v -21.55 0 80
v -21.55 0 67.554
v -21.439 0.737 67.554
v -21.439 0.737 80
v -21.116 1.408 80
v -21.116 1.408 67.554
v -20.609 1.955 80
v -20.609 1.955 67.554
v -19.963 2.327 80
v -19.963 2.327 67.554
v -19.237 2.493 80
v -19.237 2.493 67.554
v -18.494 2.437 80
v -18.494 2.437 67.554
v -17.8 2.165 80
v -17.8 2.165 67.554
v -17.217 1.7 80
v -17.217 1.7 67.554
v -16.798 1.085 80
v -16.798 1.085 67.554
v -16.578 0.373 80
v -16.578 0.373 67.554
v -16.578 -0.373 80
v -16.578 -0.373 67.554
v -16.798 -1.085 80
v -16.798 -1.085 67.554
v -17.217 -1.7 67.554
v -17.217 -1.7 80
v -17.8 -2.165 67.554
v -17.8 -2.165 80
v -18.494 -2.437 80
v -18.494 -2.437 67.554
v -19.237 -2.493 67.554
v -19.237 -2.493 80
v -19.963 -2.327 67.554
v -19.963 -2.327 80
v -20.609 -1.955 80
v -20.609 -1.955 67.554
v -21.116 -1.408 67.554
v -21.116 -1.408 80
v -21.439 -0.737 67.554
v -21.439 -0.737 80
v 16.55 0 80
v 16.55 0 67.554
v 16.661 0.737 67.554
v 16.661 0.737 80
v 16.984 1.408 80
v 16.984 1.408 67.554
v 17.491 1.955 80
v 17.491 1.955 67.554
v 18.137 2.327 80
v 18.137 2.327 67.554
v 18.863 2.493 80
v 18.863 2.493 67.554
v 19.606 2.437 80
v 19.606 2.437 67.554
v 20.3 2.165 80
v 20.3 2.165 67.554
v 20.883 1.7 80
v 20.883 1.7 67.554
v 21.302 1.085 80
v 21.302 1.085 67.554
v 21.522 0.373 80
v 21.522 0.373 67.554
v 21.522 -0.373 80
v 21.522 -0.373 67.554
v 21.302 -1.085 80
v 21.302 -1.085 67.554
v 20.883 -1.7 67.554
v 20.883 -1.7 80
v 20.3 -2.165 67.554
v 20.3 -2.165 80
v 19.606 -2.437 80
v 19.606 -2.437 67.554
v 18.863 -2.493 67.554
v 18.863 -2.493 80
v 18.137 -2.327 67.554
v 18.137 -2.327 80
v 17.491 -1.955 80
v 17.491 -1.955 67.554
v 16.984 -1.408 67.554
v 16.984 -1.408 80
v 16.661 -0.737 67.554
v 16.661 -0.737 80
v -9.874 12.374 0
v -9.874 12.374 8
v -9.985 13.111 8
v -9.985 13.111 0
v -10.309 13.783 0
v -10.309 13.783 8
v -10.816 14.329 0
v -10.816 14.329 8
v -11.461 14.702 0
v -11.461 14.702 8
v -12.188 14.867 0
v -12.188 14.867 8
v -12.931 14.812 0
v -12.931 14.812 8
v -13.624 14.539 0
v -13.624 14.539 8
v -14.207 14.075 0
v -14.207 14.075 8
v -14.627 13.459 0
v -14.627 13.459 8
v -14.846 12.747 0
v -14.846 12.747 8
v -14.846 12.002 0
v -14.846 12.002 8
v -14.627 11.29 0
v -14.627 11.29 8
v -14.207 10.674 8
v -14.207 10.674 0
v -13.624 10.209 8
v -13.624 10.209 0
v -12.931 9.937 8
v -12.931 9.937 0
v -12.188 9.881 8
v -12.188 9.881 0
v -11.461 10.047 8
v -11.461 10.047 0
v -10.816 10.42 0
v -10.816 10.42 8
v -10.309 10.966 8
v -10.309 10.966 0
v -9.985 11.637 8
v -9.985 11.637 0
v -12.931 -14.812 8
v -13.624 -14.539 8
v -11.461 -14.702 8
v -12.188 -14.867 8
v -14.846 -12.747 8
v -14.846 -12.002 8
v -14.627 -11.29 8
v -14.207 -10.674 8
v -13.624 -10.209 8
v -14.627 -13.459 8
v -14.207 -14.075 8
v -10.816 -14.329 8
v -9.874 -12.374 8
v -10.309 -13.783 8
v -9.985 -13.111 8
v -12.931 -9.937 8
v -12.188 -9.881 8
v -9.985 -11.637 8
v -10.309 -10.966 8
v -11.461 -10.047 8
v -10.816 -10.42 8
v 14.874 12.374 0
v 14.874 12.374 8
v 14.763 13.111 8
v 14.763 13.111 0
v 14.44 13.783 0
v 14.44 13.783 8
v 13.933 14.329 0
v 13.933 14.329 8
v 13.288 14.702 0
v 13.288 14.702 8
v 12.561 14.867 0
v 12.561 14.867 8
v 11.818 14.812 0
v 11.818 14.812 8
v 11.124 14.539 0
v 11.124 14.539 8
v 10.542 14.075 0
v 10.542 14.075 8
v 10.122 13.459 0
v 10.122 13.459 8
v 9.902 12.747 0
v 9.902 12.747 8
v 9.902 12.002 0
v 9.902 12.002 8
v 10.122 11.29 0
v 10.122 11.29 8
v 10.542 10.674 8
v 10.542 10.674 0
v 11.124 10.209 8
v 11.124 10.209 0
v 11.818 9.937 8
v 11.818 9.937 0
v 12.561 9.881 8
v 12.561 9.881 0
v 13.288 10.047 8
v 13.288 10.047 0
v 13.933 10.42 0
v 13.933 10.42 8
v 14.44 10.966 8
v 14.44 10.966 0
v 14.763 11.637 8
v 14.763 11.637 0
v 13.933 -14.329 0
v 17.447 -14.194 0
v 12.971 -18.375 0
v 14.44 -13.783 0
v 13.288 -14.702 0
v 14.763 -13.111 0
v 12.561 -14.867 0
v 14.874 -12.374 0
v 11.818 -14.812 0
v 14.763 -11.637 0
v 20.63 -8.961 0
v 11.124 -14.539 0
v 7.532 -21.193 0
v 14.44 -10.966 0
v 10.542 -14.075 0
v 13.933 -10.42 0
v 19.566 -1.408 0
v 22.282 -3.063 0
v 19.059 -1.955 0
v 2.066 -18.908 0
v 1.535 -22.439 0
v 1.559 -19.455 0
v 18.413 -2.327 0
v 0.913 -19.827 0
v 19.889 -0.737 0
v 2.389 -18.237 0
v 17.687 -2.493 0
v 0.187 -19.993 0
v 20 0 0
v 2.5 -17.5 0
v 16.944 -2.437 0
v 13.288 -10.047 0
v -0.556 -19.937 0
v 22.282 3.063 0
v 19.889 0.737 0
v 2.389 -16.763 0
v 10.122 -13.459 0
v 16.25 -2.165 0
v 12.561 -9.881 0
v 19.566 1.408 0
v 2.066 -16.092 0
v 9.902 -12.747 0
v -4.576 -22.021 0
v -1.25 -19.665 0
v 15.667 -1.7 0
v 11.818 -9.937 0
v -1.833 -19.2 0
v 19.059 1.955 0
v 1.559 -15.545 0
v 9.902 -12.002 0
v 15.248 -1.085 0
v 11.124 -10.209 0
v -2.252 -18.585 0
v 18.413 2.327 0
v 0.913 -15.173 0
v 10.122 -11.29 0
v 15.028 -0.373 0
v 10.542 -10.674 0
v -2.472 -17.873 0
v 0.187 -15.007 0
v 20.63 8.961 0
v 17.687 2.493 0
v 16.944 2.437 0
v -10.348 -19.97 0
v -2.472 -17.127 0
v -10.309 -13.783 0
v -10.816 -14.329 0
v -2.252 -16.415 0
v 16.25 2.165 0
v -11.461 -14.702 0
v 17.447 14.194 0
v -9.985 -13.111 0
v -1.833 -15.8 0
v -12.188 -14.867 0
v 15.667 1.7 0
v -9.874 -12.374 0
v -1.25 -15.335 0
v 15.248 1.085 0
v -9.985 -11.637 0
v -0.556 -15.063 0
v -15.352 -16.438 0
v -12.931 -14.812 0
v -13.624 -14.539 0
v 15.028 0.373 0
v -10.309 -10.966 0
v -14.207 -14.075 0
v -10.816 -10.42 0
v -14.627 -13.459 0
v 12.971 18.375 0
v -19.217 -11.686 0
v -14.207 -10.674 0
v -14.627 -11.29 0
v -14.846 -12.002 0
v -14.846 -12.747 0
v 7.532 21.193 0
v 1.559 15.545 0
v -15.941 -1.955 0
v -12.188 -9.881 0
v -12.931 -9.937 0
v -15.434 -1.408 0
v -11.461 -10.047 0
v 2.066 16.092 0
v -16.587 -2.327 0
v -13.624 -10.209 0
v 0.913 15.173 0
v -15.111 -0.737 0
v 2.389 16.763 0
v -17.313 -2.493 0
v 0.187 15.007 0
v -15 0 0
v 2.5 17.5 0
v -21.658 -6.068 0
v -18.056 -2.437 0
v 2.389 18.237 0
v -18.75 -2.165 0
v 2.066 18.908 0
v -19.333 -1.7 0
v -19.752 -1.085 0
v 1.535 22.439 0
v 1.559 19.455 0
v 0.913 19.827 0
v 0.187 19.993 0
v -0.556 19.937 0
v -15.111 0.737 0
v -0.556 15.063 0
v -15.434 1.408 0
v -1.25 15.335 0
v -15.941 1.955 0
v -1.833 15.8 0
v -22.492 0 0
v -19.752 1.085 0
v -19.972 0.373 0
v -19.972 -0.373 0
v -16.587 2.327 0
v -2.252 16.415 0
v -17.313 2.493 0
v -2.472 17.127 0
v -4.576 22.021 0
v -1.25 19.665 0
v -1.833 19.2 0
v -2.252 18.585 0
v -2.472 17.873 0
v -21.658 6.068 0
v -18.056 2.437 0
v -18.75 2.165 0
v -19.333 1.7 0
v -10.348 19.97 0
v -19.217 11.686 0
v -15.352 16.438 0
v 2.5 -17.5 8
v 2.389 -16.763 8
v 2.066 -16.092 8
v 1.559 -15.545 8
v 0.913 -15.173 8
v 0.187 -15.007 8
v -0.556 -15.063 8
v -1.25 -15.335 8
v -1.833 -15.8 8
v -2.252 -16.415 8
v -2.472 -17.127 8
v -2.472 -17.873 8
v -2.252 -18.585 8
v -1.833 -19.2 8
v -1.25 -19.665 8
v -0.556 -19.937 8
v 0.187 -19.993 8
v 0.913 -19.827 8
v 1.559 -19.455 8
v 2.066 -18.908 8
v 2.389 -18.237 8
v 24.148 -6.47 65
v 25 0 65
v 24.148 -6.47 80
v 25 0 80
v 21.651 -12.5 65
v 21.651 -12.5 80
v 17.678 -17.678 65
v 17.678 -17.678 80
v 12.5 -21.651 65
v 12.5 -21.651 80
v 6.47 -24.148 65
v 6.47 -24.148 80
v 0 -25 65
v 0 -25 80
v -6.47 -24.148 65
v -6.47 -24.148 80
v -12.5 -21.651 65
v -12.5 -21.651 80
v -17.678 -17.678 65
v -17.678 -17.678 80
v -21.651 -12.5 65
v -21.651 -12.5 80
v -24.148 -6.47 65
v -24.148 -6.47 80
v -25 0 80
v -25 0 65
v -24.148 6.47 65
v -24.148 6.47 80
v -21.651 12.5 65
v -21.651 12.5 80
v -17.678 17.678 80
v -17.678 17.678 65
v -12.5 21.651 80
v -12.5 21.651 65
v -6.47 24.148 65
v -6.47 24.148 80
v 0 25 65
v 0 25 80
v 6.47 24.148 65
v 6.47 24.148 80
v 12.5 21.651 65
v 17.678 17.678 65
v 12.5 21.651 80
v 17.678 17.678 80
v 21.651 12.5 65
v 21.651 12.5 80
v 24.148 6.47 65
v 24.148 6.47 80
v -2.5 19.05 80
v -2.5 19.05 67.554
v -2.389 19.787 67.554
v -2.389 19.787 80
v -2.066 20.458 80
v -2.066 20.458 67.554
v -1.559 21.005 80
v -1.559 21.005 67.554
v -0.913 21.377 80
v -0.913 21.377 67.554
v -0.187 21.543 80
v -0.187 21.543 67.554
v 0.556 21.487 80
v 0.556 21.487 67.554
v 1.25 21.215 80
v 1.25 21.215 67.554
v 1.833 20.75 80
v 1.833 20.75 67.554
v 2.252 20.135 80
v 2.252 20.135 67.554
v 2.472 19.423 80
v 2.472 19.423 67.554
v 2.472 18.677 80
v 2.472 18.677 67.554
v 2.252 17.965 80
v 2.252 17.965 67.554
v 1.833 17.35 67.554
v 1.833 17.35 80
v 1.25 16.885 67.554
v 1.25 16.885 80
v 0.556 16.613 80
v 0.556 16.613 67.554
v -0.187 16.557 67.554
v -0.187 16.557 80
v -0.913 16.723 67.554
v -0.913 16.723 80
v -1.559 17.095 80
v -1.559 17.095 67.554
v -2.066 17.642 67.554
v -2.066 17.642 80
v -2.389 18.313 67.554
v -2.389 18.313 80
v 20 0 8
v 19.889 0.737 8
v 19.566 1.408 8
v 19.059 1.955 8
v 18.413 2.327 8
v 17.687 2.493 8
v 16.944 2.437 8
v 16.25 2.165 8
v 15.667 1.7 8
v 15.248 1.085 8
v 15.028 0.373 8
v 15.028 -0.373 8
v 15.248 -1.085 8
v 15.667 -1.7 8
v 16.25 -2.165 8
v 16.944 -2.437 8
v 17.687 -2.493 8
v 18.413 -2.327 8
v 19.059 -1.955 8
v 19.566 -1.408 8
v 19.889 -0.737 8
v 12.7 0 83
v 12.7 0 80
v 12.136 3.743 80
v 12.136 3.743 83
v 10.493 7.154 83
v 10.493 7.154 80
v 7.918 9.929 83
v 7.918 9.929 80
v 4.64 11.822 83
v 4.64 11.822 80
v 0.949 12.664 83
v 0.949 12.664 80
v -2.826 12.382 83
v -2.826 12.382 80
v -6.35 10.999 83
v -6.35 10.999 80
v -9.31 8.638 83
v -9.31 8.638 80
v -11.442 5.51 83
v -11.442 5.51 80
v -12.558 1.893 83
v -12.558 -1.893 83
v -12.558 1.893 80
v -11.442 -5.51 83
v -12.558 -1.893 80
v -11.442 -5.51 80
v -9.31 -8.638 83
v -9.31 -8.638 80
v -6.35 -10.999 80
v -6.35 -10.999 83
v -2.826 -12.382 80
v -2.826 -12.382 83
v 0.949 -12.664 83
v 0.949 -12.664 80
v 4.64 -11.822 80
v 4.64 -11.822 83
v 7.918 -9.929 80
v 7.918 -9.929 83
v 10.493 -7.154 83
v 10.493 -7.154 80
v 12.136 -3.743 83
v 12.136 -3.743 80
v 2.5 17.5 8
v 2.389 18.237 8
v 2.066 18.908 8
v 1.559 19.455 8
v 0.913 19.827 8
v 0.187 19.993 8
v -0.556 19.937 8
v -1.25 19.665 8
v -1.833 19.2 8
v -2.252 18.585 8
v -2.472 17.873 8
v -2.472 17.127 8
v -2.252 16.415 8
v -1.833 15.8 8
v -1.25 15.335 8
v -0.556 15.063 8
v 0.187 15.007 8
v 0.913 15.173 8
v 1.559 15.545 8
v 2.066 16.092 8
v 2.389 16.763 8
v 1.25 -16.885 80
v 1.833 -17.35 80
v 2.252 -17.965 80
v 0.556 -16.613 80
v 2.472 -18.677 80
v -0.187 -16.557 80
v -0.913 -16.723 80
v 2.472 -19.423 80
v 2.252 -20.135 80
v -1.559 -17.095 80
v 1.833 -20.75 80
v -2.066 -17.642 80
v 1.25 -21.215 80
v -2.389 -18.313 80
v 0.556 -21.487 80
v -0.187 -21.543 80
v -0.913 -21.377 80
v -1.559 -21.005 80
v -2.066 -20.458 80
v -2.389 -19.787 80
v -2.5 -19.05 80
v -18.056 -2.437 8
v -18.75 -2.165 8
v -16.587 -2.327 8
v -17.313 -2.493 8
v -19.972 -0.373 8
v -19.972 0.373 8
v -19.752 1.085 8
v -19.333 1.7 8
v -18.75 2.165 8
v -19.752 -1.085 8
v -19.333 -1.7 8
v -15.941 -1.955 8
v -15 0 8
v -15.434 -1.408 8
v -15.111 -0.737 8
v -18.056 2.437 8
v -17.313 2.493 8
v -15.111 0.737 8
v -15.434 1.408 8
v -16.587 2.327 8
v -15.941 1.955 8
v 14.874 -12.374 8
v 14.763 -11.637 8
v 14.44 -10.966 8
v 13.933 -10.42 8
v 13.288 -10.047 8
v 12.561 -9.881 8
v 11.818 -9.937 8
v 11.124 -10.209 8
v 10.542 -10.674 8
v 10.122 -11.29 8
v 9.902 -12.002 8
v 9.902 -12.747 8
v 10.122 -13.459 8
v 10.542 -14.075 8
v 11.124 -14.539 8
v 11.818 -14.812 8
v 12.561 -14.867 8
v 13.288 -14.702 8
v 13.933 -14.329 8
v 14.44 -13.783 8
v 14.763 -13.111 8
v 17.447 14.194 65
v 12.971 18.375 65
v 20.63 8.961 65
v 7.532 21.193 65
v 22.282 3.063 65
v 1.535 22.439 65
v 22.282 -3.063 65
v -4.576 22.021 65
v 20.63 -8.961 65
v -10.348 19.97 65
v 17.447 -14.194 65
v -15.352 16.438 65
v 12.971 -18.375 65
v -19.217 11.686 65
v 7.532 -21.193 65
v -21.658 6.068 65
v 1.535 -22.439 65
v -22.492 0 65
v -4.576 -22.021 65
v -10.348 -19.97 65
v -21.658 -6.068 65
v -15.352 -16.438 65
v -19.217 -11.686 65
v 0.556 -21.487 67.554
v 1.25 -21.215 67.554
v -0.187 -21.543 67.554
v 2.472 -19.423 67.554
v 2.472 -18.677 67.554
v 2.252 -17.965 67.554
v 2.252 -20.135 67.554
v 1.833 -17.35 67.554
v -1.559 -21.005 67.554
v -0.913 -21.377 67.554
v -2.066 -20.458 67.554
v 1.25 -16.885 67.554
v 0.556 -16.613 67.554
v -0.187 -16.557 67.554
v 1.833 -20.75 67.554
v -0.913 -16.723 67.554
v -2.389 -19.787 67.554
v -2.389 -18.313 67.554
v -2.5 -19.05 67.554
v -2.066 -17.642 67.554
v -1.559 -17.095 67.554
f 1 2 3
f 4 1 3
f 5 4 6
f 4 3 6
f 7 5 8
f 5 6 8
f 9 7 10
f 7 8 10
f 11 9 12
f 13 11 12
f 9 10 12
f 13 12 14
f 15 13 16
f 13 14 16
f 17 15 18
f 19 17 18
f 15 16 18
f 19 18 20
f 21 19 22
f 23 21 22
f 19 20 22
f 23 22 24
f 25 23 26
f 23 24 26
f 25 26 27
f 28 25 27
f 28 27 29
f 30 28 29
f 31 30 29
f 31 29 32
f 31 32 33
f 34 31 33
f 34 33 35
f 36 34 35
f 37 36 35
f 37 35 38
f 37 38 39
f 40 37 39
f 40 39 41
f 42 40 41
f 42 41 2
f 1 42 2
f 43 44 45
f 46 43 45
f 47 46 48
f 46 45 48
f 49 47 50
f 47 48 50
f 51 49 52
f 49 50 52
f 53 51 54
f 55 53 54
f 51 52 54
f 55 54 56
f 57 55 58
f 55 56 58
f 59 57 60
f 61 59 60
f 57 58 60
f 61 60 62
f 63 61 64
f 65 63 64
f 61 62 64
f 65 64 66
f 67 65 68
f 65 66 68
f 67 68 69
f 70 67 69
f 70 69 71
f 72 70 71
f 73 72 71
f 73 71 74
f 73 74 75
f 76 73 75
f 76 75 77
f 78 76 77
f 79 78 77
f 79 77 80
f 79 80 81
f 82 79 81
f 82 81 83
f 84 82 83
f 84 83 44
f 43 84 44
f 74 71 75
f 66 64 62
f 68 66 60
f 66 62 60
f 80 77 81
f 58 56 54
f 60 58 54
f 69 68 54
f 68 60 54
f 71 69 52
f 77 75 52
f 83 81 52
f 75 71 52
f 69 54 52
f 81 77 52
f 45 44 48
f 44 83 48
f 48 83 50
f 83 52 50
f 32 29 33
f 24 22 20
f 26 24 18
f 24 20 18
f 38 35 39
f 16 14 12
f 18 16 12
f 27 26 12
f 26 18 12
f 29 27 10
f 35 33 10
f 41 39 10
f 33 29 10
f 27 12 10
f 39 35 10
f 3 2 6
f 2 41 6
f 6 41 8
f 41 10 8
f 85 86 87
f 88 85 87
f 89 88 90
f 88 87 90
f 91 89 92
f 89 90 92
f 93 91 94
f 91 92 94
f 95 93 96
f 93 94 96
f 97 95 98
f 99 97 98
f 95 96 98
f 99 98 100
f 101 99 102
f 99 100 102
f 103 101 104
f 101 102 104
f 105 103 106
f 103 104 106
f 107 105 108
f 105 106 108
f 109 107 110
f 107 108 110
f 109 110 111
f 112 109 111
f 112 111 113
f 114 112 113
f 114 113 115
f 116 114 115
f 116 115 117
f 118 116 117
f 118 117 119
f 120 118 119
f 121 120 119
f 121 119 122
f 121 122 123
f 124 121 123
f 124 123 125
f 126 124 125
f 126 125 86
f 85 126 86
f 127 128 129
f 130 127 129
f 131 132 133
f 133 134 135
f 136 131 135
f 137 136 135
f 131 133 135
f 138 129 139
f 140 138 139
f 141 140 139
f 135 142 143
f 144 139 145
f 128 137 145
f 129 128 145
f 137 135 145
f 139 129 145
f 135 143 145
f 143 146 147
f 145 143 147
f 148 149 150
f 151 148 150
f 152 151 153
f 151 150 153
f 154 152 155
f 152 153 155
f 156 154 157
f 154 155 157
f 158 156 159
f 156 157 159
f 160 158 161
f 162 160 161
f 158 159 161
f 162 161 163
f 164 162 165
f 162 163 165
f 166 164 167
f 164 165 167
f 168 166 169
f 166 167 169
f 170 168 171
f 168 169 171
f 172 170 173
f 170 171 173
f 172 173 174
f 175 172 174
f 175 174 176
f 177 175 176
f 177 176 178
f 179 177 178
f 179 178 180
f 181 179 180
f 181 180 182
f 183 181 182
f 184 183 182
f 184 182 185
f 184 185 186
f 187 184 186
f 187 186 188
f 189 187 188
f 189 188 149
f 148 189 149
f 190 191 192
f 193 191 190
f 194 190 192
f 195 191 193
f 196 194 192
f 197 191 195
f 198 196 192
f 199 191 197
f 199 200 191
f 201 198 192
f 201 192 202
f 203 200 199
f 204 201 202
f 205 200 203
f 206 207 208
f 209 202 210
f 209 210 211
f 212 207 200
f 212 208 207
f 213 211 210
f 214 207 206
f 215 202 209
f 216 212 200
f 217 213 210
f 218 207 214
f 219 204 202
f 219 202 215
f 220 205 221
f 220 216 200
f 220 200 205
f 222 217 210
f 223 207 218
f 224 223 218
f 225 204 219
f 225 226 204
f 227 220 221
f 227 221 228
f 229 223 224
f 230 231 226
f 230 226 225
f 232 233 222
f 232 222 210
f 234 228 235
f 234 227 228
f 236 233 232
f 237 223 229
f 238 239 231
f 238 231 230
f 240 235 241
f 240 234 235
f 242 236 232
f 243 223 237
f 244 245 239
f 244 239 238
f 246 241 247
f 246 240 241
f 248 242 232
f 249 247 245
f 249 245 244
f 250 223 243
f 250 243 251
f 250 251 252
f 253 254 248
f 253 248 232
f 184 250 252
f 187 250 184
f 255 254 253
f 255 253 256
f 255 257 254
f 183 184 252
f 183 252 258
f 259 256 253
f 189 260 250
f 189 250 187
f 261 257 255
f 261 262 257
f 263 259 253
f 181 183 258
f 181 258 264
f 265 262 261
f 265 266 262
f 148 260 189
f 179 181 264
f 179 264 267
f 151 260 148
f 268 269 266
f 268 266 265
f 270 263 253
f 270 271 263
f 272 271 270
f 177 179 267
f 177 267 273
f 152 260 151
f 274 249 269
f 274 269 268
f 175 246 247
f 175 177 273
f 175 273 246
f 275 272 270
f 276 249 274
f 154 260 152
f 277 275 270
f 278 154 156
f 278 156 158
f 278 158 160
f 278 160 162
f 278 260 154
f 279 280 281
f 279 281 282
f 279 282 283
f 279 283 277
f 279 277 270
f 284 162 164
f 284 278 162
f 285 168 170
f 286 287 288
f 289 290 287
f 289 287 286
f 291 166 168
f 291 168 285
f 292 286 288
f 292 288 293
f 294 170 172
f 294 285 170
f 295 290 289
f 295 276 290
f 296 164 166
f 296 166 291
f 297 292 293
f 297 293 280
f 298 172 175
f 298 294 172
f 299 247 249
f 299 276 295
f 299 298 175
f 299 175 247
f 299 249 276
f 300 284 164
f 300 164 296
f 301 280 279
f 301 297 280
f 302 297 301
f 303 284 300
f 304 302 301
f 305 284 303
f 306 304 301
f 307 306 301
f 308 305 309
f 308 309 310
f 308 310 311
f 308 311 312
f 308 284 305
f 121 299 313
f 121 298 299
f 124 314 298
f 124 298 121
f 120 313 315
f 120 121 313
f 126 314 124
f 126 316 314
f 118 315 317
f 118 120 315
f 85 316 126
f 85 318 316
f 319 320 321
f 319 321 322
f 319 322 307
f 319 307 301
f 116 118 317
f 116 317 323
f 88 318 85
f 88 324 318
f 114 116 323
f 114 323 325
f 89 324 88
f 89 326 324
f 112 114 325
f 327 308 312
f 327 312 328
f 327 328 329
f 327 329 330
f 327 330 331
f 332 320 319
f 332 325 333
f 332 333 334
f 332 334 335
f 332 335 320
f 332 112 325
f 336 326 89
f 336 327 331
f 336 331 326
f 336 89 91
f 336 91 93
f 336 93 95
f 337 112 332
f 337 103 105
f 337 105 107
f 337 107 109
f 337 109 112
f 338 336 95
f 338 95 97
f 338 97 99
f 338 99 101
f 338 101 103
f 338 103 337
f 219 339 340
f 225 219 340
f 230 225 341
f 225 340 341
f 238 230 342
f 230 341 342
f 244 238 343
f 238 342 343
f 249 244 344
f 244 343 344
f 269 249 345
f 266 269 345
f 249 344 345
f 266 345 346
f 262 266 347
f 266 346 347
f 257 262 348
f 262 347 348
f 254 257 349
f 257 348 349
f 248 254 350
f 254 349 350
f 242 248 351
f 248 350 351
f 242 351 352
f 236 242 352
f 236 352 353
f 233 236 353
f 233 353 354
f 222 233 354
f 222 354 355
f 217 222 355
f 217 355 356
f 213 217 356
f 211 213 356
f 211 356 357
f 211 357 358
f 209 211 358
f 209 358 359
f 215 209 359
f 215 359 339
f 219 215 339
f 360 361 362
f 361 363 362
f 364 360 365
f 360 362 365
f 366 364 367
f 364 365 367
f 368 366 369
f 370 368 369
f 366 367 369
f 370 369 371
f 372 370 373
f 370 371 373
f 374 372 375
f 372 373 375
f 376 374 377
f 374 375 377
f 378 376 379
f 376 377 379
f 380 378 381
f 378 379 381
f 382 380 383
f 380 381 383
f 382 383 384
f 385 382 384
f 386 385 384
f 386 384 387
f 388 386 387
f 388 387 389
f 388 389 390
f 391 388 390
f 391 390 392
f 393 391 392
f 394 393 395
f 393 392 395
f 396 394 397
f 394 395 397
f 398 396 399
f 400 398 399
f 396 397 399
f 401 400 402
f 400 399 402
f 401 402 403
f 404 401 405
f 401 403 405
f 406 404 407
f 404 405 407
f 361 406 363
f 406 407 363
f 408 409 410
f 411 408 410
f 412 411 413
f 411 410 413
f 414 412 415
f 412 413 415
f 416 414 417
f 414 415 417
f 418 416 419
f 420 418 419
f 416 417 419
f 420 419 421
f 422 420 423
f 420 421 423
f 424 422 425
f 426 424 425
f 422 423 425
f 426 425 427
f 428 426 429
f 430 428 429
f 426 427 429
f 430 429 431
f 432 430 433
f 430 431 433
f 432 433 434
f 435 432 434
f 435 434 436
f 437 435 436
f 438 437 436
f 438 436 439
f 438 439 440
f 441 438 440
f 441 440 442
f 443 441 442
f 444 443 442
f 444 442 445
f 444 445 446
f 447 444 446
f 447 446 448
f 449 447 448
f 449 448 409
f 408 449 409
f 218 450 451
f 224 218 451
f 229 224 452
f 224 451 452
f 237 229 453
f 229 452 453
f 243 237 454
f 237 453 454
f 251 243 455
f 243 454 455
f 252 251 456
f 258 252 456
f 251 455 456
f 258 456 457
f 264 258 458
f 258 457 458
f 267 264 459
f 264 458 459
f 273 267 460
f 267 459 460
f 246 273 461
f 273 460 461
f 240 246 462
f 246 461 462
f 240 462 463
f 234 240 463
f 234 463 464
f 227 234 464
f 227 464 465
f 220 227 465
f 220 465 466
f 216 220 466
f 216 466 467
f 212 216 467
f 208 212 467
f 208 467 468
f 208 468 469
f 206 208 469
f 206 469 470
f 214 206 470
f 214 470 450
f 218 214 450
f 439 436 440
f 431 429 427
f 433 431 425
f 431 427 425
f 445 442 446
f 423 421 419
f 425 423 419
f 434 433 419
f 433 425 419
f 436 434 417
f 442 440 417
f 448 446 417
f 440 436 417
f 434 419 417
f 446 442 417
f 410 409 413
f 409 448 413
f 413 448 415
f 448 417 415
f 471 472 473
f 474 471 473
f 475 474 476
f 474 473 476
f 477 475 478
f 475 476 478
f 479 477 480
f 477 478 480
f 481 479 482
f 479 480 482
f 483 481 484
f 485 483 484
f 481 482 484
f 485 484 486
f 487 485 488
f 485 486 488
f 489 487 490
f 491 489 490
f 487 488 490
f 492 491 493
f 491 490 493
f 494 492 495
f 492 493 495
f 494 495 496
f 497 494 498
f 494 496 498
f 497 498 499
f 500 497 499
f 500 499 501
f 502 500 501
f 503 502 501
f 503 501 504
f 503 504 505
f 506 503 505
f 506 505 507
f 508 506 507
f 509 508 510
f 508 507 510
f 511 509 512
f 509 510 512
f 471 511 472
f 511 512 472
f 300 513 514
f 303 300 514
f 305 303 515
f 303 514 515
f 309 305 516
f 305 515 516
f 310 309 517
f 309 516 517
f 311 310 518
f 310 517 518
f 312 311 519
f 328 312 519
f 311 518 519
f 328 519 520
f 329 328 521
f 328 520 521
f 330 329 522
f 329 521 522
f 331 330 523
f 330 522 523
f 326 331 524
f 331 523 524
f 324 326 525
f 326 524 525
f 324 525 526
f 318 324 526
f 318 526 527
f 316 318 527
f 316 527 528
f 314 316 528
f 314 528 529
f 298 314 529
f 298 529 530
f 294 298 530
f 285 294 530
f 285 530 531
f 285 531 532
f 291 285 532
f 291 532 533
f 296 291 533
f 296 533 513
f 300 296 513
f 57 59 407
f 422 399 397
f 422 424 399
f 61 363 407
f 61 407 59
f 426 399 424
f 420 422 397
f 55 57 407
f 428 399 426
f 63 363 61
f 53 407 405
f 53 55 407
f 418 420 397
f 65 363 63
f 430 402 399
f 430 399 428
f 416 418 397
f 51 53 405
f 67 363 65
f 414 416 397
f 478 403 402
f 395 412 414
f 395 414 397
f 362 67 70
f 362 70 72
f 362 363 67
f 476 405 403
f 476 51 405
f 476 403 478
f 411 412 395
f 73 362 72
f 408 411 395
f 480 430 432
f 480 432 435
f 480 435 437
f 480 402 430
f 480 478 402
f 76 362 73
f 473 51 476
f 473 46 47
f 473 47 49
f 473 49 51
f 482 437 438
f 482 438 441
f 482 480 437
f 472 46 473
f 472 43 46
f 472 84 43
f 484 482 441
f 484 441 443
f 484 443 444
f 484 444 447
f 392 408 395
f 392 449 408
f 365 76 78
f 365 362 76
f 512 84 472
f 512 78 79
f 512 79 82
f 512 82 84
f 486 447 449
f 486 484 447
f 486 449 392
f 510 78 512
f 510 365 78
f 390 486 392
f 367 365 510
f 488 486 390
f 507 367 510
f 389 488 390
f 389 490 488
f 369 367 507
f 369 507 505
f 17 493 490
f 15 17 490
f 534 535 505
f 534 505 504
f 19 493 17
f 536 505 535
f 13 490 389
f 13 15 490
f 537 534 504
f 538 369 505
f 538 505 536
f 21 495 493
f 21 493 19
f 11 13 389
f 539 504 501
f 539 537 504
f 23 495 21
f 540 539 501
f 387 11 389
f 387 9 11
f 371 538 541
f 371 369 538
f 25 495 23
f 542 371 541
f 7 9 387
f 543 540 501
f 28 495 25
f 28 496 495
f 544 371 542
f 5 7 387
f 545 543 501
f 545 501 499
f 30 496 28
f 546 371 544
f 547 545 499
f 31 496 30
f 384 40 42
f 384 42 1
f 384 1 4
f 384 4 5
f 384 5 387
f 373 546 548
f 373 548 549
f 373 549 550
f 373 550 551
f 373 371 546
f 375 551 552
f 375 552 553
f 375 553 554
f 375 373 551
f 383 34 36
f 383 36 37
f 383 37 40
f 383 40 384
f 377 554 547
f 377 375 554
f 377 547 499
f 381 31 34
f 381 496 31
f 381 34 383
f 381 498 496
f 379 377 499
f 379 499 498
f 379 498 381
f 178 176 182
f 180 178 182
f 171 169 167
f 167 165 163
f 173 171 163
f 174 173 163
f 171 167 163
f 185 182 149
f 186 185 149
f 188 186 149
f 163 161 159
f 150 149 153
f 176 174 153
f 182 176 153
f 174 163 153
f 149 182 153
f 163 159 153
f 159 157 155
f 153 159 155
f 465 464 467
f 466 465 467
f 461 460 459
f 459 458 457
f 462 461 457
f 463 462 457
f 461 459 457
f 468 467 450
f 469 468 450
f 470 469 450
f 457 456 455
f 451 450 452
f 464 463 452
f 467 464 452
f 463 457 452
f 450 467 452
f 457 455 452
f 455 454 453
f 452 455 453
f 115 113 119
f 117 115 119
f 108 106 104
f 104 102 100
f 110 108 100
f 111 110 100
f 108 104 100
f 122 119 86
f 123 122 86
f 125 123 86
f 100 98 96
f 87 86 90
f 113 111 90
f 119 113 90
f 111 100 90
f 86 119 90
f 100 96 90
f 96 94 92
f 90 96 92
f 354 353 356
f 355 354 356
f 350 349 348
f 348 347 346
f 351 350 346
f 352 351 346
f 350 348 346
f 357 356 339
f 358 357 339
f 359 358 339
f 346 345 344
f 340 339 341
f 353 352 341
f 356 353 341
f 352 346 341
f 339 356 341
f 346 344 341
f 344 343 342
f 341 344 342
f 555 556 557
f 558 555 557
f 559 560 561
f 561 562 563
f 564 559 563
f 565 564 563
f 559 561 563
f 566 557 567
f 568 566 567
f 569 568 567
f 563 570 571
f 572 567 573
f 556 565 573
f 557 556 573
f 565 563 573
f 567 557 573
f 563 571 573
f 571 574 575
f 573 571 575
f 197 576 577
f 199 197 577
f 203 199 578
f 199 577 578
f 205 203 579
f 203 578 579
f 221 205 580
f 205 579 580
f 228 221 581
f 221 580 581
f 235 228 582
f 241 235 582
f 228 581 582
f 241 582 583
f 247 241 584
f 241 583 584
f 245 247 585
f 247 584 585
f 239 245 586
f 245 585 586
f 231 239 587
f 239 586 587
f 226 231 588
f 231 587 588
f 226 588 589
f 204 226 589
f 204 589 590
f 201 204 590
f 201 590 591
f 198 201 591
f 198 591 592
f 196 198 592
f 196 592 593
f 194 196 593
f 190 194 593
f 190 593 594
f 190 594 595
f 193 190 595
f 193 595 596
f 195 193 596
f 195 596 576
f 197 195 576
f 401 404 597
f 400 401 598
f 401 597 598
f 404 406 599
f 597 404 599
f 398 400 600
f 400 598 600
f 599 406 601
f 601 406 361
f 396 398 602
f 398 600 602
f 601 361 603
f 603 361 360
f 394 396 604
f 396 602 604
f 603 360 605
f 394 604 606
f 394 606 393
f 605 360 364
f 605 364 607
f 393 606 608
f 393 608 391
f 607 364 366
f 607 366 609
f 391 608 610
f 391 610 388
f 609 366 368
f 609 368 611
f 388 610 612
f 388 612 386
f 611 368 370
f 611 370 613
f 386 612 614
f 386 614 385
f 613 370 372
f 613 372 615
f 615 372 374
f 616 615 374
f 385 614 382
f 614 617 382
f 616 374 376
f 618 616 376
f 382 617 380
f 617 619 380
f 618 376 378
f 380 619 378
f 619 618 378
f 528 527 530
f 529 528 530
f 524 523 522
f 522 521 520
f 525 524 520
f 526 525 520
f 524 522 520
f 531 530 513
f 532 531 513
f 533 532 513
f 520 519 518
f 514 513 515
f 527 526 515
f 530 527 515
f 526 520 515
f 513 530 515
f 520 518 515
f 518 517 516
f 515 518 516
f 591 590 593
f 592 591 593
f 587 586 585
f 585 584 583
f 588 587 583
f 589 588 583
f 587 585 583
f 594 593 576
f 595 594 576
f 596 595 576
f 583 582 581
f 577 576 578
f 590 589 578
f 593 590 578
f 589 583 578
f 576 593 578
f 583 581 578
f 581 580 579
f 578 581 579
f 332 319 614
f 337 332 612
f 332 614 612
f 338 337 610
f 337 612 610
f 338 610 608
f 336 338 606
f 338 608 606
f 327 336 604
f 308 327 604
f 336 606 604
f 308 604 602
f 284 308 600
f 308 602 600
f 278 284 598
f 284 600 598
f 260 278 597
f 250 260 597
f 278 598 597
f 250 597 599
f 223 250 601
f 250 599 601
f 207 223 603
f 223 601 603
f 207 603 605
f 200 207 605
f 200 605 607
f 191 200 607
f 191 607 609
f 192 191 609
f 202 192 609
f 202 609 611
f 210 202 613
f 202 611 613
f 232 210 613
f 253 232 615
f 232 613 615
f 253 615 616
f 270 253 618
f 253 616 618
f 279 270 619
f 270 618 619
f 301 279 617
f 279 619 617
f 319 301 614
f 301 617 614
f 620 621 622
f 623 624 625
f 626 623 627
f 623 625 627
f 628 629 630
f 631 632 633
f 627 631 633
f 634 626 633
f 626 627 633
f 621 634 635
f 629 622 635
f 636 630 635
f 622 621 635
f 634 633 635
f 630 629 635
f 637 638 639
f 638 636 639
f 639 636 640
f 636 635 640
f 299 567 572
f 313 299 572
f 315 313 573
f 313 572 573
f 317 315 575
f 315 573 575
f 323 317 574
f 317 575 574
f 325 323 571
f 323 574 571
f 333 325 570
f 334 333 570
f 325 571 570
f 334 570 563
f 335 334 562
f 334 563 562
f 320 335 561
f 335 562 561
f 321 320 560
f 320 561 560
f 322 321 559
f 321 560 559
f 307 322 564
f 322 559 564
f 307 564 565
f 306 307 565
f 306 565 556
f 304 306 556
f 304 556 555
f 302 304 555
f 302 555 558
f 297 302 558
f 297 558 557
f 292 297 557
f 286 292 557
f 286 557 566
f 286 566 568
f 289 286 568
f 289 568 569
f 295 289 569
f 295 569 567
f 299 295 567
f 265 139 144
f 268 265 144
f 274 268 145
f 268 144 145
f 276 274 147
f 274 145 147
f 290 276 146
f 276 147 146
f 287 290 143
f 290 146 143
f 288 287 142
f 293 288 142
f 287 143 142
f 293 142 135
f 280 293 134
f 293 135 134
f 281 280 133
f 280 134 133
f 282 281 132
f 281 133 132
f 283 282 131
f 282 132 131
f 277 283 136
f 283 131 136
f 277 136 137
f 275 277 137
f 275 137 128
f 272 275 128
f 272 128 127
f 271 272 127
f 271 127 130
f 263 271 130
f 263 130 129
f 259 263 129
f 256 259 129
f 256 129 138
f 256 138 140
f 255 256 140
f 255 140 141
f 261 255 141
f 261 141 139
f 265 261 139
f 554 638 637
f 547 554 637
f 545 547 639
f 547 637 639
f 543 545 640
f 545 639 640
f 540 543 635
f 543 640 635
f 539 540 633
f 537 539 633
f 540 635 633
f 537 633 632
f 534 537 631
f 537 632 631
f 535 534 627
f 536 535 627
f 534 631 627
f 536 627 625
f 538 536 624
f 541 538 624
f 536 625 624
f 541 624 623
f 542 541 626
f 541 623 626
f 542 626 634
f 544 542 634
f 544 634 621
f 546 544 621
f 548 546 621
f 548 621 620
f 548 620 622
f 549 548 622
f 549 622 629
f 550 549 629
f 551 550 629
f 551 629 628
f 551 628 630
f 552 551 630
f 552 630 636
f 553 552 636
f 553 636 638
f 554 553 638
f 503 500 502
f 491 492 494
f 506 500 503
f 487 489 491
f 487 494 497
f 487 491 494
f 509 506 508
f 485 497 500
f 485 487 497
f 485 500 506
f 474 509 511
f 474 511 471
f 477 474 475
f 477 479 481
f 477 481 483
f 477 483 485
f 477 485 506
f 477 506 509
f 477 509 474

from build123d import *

# Parameters (mm, degrees)
SKETCH1_W                  = 25
SKETCH1_H                  = 15
SKETCH2_R                  = 12.7
BOSS_EXTRUDE1_DEPTH        = 3
SKETCH3_R                  = 22.4917
BOSS_EXTRUDE2_DEPTH        = 65
F_10_CLEARANCE_HOLE1_D     = 5
F_10_CLEARANCE_HOLE1_DEPTH = 8
F_10_CLEARANCE_HOLE2_D     = 5
F_10_CLEARANCE_HOLE2_DEPTH = 12.446


with BuildPart() as part:
    # Sketch1 → Revolve1 (revolve)
    with BuildSketch(Plane.XZ):
        with Locations((12.5, 72.5)):
            Rectangle(SKETCH1_W, SKETCH1_H)
    revolve(axis=Axis((0, 0, 80), (0, 0, -1)))

    # Sketch2 → Boss-Extrude1 (add)
    with BuildSketch(Plane.XY.offset(80)):
        Circle(SKETCH2_R)
    extrude(amount=BOSS_EXTRUDE1_DEPTH)

    # Sketch3 → Boss-Extrude2 (add)
    with BuildSketch(Plane(origin=(0, 0, 65), x_dir=(-1, 0, 0), z_dir=(0, 0, -1))):
        Circle(SKETCH3_R)
    extrude(amount=BOSS_EXTRUDE2_DEPTH)

    # #10 Clearance Hole1
    with Locations(Plane(origin=(0, 0, 0), x_dir=(-1, 0, 0), z_dir=(0, 0, -1))):
        with Locations((-12.374368671, 12.374368671), (-17.5, 0), (-12.374368671, -12.374368671), (0, -17.5), (12.374368671, -12.374368671), (17.5, 0), (12.374368671, 12.374368671), (0, 17.5)):
            Hole(F_10_CLEARANCE_HOLE1_D / 2, depth=F_10_CLEARANCE_HOLE1_DEPTH)

    # #10 Clearance Hole2
    with Locations(Plane.XY.offset(80)):
        with Locations((-19.05, 0), (0, -19.05), (19.05, 0), (0, 19.05)):
            Hole(F_10_CLEARANCE_HOLE2_D / 2, depth=F_10_CLEARANCE_HOLE2_DEPTH)


solid = part.part
